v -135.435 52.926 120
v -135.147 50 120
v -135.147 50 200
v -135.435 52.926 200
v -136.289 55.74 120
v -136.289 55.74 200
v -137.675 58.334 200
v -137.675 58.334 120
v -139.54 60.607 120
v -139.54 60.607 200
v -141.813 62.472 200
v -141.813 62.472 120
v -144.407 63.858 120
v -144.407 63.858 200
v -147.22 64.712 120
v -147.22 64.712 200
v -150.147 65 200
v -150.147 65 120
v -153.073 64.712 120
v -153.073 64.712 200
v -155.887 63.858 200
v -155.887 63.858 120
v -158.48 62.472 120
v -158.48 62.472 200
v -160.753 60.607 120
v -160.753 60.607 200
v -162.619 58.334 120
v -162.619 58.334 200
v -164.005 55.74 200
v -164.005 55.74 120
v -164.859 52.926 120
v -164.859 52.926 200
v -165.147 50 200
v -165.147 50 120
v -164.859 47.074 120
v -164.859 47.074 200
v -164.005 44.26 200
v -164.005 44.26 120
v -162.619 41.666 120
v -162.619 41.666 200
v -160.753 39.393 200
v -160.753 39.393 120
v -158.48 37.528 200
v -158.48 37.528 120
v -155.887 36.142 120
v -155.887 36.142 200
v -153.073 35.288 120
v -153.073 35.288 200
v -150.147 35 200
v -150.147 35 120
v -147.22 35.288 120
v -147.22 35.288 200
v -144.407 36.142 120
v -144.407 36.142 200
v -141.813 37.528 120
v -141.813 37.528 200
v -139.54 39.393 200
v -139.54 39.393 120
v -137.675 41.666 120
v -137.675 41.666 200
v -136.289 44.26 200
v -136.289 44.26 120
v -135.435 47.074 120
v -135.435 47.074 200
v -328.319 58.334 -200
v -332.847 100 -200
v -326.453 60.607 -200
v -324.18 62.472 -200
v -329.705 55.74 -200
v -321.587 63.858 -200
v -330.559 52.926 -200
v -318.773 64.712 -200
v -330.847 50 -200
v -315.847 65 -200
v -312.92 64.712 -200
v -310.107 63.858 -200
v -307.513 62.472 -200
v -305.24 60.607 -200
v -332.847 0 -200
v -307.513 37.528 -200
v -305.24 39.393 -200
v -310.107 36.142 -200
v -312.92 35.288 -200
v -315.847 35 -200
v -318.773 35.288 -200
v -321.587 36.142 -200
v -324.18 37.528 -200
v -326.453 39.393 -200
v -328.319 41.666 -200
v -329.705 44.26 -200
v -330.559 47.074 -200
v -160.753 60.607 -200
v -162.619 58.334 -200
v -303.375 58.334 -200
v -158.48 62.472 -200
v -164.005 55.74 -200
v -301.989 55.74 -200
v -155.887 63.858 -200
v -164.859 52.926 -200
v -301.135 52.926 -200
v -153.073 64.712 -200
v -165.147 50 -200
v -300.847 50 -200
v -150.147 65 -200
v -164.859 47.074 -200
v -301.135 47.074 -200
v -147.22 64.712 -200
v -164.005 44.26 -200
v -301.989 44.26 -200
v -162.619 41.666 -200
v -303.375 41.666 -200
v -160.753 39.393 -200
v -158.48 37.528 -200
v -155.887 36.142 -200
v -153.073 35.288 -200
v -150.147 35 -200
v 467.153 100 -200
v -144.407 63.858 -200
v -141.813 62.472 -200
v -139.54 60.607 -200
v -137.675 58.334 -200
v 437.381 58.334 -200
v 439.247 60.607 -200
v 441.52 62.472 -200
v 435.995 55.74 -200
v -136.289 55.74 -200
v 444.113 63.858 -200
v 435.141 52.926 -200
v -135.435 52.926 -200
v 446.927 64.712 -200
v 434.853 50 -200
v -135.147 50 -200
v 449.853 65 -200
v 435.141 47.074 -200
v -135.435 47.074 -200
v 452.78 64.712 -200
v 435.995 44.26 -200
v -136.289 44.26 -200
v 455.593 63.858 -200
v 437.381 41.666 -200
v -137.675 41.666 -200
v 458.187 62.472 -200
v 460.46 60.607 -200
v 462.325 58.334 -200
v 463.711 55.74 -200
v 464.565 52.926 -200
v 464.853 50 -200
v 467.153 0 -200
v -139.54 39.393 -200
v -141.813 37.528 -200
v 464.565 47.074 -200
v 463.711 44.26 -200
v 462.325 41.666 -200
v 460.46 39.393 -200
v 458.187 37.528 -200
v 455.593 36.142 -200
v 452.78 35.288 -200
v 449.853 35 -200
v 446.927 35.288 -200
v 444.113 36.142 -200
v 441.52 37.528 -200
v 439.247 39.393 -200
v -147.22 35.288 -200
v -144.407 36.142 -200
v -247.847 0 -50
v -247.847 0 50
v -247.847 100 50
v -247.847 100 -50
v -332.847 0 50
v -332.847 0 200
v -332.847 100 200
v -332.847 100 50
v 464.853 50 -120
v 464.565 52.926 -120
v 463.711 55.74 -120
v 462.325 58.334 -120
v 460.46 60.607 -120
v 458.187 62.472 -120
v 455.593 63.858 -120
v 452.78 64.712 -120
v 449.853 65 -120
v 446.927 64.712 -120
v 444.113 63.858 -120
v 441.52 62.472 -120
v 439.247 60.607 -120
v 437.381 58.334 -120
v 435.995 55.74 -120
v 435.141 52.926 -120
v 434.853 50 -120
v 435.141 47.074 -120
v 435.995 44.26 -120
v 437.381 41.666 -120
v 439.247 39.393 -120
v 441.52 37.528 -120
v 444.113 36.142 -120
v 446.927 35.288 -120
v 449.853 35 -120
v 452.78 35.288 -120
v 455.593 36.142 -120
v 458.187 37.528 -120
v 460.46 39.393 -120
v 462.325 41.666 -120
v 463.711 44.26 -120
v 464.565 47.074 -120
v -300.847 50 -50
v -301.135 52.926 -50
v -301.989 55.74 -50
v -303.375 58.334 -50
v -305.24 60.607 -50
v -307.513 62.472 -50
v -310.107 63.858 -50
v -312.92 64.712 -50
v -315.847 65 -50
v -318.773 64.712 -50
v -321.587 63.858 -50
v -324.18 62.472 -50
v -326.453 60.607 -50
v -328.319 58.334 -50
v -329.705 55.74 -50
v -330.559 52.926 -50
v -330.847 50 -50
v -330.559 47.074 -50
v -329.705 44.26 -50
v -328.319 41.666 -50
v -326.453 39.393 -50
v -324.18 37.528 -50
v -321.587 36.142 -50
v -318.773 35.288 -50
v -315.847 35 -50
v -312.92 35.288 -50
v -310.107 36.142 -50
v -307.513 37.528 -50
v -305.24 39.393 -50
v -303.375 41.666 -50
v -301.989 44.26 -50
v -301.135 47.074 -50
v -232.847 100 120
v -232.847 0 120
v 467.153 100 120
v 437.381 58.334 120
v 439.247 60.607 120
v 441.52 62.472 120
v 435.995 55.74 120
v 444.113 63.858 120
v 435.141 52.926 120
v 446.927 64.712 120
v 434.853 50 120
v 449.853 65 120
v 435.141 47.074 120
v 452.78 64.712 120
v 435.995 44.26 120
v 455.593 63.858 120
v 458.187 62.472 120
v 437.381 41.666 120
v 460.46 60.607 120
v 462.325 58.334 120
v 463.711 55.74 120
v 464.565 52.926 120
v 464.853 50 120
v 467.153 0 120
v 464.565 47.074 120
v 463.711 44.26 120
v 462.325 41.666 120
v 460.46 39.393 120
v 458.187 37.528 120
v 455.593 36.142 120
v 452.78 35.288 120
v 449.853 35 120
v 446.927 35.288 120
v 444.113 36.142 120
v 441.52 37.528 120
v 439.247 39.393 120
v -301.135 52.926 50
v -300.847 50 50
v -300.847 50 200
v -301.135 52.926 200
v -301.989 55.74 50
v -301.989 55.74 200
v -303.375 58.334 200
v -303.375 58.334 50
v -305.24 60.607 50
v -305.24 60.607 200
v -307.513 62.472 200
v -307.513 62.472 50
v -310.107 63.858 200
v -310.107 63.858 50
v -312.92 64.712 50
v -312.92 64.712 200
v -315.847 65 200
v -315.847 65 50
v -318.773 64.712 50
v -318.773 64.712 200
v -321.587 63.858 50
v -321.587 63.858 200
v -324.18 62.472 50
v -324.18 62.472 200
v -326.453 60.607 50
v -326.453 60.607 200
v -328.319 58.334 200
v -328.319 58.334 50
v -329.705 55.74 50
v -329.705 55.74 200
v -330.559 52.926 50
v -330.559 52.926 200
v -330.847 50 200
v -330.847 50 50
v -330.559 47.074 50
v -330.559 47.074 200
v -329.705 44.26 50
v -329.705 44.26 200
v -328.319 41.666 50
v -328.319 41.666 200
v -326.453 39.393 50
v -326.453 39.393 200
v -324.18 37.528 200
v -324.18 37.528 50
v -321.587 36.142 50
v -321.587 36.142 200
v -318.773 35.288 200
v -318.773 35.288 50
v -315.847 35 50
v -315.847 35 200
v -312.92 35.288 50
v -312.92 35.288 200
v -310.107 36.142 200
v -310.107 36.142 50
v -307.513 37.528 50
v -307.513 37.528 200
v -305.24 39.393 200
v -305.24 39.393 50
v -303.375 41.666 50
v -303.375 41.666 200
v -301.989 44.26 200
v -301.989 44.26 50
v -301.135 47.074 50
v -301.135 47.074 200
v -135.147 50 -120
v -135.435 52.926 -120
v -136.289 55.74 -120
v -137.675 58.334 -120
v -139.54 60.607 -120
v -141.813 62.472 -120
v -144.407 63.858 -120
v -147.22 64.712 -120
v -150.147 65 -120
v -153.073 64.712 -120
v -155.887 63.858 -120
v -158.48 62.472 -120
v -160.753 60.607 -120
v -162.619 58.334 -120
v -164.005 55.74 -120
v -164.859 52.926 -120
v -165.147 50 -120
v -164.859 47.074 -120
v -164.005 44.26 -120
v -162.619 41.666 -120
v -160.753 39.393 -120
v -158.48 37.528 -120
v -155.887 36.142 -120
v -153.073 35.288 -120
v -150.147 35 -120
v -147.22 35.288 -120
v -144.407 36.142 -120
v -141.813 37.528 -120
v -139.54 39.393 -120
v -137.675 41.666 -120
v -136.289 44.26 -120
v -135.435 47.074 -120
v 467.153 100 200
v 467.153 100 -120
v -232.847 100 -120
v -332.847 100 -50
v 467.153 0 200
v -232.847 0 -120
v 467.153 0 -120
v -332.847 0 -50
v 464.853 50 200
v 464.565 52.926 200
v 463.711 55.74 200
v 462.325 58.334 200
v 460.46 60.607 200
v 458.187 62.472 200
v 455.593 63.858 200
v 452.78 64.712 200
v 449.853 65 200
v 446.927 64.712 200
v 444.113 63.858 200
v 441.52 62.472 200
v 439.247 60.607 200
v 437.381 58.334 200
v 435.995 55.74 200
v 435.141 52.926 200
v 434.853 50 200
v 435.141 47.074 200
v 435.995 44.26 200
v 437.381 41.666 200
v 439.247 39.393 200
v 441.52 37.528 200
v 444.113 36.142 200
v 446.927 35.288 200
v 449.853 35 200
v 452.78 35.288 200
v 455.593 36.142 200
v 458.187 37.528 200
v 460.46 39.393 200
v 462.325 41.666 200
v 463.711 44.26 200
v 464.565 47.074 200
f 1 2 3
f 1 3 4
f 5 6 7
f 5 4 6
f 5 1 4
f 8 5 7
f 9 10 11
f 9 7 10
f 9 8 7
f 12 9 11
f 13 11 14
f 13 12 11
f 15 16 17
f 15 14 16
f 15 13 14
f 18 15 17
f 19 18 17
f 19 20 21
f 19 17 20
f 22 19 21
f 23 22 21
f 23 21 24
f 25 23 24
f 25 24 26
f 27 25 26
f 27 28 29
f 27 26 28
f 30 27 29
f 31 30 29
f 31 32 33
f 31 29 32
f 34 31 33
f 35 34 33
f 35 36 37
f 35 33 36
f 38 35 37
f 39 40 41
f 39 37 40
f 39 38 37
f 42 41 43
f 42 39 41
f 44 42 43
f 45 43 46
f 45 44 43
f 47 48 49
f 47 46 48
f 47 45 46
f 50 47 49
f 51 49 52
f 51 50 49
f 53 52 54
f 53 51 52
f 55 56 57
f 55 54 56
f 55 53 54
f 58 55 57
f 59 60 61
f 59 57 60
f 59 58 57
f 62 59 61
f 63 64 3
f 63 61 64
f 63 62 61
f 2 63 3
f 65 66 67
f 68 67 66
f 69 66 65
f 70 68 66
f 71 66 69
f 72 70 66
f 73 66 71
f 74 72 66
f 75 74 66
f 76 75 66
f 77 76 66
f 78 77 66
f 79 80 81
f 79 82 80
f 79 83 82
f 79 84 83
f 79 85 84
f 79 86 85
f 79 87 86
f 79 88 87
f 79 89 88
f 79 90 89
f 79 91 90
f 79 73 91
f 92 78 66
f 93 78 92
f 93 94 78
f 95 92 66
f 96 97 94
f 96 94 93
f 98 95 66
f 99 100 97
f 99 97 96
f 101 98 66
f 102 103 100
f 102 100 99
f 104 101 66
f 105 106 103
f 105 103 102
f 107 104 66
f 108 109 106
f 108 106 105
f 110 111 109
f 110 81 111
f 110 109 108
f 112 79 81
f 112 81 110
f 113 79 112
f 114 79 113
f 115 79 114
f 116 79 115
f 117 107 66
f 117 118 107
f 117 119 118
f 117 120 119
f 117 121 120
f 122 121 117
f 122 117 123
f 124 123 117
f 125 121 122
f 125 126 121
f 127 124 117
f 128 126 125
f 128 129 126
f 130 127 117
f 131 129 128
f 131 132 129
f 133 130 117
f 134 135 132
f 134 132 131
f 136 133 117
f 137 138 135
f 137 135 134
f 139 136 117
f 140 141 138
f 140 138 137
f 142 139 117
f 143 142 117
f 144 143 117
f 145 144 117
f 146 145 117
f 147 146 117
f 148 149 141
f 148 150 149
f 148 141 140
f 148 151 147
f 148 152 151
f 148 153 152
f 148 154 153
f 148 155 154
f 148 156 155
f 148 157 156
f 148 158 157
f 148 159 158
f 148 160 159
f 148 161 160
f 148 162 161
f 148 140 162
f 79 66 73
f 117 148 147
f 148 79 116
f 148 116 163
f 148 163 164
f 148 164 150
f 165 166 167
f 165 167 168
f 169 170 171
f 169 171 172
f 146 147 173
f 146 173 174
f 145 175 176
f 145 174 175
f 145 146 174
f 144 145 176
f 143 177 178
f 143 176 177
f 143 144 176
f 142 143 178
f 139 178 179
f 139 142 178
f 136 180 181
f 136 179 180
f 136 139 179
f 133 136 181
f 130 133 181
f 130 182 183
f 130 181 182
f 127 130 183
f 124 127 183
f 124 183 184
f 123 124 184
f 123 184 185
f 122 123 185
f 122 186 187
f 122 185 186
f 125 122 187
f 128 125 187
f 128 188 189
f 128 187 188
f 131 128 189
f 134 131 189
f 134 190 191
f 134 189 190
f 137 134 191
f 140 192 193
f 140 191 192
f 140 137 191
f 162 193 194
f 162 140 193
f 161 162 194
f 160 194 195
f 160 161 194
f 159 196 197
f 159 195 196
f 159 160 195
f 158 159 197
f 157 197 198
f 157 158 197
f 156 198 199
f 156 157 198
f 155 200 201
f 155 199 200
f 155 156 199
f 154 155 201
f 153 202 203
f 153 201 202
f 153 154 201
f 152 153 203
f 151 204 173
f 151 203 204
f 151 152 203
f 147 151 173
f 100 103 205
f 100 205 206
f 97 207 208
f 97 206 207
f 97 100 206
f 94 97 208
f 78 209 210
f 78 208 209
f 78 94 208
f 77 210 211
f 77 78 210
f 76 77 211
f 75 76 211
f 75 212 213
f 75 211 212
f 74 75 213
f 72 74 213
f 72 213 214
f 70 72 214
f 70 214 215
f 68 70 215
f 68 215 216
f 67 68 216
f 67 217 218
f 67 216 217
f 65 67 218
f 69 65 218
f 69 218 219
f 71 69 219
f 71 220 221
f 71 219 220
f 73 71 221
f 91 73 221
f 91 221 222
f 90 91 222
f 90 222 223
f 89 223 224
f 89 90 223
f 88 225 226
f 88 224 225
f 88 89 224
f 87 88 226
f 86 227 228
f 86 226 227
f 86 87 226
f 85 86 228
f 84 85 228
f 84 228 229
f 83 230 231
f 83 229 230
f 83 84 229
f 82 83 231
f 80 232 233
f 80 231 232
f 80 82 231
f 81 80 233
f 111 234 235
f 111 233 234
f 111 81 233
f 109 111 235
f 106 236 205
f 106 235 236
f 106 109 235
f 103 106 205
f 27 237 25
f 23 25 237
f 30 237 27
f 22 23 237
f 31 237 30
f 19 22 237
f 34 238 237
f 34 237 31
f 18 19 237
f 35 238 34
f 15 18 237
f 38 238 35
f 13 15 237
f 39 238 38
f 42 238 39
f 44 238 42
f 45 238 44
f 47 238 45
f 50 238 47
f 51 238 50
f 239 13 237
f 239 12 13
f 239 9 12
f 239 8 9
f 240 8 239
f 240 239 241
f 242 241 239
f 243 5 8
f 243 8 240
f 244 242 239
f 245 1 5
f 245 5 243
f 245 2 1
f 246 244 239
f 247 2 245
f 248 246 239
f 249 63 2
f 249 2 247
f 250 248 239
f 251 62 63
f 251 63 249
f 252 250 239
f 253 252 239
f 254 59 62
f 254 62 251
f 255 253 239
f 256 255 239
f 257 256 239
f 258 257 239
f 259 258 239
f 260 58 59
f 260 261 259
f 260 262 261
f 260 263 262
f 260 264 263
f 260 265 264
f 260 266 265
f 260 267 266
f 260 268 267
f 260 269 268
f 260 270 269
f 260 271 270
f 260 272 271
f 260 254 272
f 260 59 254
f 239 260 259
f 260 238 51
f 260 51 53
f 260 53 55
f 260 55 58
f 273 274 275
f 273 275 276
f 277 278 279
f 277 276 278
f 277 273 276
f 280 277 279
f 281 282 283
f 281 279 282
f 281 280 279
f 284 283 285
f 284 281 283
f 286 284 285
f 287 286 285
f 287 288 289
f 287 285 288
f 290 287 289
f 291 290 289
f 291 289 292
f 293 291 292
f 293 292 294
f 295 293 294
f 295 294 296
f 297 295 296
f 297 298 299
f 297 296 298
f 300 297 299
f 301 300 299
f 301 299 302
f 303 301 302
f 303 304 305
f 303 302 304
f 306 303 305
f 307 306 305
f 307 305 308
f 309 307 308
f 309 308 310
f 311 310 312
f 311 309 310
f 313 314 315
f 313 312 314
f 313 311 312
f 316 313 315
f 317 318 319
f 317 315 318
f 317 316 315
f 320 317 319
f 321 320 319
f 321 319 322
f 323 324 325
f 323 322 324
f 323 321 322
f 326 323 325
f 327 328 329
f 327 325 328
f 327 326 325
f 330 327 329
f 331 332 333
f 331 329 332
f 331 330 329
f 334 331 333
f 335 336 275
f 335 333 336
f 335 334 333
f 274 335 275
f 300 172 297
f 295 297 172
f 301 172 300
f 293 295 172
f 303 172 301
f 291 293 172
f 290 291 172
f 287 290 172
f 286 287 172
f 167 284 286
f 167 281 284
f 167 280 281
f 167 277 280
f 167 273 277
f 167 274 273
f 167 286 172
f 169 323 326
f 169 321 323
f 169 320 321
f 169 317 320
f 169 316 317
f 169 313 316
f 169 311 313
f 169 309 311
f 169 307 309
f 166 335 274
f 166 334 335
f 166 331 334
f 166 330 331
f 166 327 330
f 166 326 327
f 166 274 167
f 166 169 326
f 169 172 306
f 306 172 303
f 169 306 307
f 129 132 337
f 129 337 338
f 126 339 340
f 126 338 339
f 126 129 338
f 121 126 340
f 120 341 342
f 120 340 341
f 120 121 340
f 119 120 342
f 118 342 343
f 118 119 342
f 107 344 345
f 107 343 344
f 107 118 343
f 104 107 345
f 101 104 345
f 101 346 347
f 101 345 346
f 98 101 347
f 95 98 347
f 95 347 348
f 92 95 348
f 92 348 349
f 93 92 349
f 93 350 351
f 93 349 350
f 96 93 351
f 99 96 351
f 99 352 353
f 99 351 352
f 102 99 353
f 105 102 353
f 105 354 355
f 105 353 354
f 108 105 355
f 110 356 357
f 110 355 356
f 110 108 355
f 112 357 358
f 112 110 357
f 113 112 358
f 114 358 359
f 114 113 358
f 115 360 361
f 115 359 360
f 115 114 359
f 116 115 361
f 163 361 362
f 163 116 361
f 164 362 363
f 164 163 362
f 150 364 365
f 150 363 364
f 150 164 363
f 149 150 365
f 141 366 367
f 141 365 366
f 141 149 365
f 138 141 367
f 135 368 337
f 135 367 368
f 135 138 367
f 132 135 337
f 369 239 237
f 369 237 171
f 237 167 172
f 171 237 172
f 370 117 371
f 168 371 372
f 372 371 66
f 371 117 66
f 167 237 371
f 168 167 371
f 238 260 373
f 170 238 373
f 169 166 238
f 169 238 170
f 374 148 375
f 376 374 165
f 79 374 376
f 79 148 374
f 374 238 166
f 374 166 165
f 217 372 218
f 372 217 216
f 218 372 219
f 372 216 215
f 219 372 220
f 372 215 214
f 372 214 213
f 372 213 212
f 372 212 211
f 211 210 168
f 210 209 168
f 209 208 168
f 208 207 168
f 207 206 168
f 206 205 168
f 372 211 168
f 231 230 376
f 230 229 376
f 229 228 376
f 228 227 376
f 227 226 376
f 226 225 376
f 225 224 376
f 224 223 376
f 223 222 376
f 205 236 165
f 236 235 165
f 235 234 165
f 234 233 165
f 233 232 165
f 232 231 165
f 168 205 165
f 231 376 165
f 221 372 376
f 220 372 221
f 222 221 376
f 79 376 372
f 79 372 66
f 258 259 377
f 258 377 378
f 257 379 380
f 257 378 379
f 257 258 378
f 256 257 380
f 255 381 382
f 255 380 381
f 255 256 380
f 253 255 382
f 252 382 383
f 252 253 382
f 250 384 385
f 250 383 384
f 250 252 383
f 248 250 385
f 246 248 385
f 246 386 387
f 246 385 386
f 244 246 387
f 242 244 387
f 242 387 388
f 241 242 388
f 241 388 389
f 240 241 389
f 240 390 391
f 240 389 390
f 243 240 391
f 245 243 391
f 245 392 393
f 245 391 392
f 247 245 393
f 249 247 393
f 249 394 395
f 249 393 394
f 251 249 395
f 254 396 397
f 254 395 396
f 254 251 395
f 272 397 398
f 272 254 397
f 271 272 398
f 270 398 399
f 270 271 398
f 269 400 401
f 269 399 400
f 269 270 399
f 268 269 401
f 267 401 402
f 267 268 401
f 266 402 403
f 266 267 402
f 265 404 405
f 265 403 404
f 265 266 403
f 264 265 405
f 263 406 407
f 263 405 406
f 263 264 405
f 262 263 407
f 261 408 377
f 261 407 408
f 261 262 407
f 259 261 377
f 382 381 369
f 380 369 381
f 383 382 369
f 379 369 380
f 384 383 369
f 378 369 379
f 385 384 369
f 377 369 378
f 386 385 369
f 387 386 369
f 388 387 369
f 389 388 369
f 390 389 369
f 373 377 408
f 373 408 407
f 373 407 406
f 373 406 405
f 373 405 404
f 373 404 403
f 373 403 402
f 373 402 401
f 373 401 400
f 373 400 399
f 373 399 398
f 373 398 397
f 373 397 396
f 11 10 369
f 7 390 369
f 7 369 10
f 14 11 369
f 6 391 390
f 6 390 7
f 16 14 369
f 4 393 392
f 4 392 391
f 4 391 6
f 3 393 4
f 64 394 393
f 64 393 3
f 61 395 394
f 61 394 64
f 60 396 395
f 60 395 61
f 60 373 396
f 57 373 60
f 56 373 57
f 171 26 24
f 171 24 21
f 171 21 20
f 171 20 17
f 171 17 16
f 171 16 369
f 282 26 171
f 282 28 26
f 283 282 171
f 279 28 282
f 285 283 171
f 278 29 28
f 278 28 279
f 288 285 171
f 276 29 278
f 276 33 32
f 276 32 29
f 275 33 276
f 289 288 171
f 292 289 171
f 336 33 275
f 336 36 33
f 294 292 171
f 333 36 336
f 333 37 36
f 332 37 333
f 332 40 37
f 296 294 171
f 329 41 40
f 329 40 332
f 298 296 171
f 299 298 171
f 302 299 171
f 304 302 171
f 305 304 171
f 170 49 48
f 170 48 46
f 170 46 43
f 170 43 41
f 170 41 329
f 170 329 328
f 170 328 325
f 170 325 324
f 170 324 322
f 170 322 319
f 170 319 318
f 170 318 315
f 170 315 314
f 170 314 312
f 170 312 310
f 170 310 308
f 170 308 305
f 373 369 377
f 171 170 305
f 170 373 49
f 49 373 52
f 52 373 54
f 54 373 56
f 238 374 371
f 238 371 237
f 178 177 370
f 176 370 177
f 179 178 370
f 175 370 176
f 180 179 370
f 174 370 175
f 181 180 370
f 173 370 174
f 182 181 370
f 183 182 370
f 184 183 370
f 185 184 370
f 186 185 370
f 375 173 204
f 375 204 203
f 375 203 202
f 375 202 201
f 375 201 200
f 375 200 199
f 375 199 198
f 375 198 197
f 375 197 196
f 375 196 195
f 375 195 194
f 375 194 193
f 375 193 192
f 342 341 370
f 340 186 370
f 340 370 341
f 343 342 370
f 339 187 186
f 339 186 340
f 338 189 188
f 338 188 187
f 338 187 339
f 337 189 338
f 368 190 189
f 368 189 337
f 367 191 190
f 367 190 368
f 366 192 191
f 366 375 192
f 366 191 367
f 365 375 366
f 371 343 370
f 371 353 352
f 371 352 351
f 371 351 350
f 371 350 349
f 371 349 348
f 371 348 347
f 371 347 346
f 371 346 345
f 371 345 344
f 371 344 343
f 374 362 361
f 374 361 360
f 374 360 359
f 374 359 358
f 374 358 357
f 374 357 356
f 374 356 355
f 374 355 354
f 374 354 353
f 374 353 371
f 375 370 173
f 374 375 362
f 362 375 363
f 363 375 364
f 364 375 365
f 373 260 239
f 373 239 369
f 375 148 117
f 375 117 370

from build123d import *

# Parameters (mm, degrees)
ESTRUSIONE_ESTRUSIONE1_DEPTH  = 100
TAGLIO_ESTRUSIONE5_DEPTH      = 518.911277836
TAGLIO_ESTRUSIONE5_DEPTH_BACK = 518.911277836
SCHIZZO2_R                    = 15
TAGLIO_ESTRUSIONE6_DEPTH      = 518.911277836
TAGLIO_ESTRUSIONE6_DEPTH_BACK = 518.911277836
SCHIZZO3_W                    = 85
SCHIZZO3_H                    = 100


with BuildPart() as part:
    # Schizzo1 → Estrusione-Estrusione1 (new body)
    with BuildSketch(Plane(origin=(0, 0, 0), x_dir=(1, 0, 0), z_dir=(0, 1, 0))):
        Polygon((-332.846822006, -200), (-332.846822006, 200), (467.153177994, 200), (467.153177994, 120), (-232.846822006, 120), (-232.846822006, -120), (467.153177994, -120), (467.153177994, -200), align=None)
    extrude(amount=ESTRUSIONE_ESTRUSIONE1_DEPTH)

    # Schizzo2 → Taglio-Estrusione5 (cut, two sides: drawn at the far end of the back side and taken through both)
    with BuildSketch(Plane.XY.offset(-TAGLIO_ESTRUSIONE5_DEPTH_BACK)):
        with Locations((-315.846822006, 50)):
            Circle(SCHIZZO2_R)
        with Locations((-150.146822006, 50)):
            Circle(SCHIZZO2_R)
        with Locations((449.853177994, 50)):
            Circle(SCHIZZO2_R)
    extrude(amount=TAGLIO_ESTRUSIONE5_DEPTH + TAGLIO_ESTRUSIONE5_DEPTH_BACK, mode=Mode.SUBTRACT)

    # Schizzo3 → Taglio-Estrusione6 (cut, two sides: drawn at the far end of the back side and taken through both)
    with BuildSketch(Plane(origin=(0, 0, 0), x_dir=(1, 0, 0), z_dir=(0, 1, 0)).offset(-TAGLIO_ESTRUSIONE6_DEPTH_BACK)):
        with Locations((-290.346822006, 0)):
            Rectangle(SCHIZZO3_W, SCHIZZO3_H)
    extrude(amount=TAGLIO_ESTRUSIONE6_DEPTH + TAGLIO_ESTRUSIONE6_DEPTH_BACK, mode=Mode.SUBTRACT)


solid = part.part
